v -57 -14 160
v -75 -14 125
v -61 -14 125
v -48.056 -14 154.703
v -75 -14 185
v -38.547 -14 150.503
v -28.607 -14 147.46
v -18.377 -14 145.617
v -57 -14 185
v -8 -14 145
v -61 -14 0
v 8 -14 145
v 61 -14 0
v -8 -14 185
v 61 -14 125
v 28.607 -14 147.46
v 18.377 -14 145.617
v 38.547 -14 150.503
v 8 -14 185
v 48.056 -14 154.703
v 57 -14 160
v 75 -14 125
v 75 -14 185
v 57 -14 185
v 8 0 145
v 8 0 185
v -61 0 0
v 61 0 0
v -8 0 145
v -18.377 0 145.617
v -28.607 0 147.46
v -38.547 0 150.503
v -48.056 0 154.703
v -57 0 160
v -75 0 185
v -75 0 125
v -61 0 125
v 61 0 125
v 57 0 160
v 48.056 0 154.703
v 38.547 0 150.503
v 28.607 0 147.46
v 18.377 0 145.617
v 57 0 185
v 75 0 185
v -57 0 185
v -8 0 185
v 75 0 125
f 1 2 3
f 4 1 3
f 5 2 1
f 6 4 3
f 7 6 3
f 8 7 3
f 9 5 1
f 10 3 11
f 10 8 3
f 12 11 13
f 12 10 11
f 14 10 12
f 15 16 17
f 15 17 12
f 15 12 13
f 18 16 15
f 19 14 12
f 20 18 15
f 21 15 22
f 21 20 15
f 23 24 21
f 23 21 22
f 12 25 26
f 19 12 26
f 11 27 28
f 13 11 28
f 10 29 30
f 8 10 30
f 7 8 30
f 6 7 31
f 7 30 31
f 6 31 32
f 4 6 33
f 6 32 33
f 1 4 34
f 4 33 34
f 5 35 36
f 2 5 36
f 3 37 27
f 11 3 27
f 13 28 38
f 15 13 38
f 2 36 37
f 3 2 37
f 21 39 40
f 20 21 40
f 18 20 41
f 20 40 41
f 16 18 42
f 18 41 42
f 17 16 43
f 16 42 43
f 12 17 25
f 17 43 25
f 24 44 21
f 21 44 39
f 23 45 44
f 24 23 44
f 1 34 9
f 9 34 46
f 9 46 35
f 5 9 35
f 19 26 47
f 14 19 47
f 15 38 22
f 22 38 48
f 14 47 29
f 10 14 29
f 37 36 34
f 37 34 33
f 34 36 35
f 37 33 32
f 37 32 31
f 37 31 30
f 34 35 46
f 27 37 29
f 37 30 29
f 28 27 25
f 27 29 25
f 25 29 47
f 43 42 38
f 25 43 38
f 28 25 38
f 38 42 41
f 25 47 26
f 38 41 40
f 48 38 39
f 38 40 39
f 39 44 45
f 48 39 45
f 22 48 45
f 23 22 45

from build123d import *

# Parameters (mm, degrees)
F1_DEPTH = 14


with BuildPart() as f1:
    # F0 (on Front) → F1 (new body)
    with BuildSketch(Plane.XZ):
        with BuildLine():
            Line((0, 185), (0, 0))
            Line((0, 0), (61, 0))
            Line((61, 0), (61, 125))
            Line((61, 125), (75, 125))
            Line((75, 125), (75, 185))
            Line((75, 185), (57, 185))
            Line((57, 185), (57, 160))
            ThreePointArc((57, 160), (33.622256, 148.833964), (8, 145))
            Line((8, 145), (8, 185))
            Line((8, 185), (0, 185))
        make_face()
        with BuildLine():
            Line((-61, 125), (-61, 0))
            Line((-61, 0), (0, 0))
            Line((0, 0), (0, 185))
            Line((0, 185), (-8, 185))
            Line((-8, 185), (-8, 145))
            ThreePointArc((-8, 145), (-33.622256, 148.833964), (-57, 160))
            Line((-57, 160), (-57, 185))
            Line((-57, 185), (-75, 185))
            Line((-75, 185), (-75, 125))
            Line((-75, 125), (-61, 125))
        make_face()
    extrude(amount=F1_DEPTH)


solid = f1.part
